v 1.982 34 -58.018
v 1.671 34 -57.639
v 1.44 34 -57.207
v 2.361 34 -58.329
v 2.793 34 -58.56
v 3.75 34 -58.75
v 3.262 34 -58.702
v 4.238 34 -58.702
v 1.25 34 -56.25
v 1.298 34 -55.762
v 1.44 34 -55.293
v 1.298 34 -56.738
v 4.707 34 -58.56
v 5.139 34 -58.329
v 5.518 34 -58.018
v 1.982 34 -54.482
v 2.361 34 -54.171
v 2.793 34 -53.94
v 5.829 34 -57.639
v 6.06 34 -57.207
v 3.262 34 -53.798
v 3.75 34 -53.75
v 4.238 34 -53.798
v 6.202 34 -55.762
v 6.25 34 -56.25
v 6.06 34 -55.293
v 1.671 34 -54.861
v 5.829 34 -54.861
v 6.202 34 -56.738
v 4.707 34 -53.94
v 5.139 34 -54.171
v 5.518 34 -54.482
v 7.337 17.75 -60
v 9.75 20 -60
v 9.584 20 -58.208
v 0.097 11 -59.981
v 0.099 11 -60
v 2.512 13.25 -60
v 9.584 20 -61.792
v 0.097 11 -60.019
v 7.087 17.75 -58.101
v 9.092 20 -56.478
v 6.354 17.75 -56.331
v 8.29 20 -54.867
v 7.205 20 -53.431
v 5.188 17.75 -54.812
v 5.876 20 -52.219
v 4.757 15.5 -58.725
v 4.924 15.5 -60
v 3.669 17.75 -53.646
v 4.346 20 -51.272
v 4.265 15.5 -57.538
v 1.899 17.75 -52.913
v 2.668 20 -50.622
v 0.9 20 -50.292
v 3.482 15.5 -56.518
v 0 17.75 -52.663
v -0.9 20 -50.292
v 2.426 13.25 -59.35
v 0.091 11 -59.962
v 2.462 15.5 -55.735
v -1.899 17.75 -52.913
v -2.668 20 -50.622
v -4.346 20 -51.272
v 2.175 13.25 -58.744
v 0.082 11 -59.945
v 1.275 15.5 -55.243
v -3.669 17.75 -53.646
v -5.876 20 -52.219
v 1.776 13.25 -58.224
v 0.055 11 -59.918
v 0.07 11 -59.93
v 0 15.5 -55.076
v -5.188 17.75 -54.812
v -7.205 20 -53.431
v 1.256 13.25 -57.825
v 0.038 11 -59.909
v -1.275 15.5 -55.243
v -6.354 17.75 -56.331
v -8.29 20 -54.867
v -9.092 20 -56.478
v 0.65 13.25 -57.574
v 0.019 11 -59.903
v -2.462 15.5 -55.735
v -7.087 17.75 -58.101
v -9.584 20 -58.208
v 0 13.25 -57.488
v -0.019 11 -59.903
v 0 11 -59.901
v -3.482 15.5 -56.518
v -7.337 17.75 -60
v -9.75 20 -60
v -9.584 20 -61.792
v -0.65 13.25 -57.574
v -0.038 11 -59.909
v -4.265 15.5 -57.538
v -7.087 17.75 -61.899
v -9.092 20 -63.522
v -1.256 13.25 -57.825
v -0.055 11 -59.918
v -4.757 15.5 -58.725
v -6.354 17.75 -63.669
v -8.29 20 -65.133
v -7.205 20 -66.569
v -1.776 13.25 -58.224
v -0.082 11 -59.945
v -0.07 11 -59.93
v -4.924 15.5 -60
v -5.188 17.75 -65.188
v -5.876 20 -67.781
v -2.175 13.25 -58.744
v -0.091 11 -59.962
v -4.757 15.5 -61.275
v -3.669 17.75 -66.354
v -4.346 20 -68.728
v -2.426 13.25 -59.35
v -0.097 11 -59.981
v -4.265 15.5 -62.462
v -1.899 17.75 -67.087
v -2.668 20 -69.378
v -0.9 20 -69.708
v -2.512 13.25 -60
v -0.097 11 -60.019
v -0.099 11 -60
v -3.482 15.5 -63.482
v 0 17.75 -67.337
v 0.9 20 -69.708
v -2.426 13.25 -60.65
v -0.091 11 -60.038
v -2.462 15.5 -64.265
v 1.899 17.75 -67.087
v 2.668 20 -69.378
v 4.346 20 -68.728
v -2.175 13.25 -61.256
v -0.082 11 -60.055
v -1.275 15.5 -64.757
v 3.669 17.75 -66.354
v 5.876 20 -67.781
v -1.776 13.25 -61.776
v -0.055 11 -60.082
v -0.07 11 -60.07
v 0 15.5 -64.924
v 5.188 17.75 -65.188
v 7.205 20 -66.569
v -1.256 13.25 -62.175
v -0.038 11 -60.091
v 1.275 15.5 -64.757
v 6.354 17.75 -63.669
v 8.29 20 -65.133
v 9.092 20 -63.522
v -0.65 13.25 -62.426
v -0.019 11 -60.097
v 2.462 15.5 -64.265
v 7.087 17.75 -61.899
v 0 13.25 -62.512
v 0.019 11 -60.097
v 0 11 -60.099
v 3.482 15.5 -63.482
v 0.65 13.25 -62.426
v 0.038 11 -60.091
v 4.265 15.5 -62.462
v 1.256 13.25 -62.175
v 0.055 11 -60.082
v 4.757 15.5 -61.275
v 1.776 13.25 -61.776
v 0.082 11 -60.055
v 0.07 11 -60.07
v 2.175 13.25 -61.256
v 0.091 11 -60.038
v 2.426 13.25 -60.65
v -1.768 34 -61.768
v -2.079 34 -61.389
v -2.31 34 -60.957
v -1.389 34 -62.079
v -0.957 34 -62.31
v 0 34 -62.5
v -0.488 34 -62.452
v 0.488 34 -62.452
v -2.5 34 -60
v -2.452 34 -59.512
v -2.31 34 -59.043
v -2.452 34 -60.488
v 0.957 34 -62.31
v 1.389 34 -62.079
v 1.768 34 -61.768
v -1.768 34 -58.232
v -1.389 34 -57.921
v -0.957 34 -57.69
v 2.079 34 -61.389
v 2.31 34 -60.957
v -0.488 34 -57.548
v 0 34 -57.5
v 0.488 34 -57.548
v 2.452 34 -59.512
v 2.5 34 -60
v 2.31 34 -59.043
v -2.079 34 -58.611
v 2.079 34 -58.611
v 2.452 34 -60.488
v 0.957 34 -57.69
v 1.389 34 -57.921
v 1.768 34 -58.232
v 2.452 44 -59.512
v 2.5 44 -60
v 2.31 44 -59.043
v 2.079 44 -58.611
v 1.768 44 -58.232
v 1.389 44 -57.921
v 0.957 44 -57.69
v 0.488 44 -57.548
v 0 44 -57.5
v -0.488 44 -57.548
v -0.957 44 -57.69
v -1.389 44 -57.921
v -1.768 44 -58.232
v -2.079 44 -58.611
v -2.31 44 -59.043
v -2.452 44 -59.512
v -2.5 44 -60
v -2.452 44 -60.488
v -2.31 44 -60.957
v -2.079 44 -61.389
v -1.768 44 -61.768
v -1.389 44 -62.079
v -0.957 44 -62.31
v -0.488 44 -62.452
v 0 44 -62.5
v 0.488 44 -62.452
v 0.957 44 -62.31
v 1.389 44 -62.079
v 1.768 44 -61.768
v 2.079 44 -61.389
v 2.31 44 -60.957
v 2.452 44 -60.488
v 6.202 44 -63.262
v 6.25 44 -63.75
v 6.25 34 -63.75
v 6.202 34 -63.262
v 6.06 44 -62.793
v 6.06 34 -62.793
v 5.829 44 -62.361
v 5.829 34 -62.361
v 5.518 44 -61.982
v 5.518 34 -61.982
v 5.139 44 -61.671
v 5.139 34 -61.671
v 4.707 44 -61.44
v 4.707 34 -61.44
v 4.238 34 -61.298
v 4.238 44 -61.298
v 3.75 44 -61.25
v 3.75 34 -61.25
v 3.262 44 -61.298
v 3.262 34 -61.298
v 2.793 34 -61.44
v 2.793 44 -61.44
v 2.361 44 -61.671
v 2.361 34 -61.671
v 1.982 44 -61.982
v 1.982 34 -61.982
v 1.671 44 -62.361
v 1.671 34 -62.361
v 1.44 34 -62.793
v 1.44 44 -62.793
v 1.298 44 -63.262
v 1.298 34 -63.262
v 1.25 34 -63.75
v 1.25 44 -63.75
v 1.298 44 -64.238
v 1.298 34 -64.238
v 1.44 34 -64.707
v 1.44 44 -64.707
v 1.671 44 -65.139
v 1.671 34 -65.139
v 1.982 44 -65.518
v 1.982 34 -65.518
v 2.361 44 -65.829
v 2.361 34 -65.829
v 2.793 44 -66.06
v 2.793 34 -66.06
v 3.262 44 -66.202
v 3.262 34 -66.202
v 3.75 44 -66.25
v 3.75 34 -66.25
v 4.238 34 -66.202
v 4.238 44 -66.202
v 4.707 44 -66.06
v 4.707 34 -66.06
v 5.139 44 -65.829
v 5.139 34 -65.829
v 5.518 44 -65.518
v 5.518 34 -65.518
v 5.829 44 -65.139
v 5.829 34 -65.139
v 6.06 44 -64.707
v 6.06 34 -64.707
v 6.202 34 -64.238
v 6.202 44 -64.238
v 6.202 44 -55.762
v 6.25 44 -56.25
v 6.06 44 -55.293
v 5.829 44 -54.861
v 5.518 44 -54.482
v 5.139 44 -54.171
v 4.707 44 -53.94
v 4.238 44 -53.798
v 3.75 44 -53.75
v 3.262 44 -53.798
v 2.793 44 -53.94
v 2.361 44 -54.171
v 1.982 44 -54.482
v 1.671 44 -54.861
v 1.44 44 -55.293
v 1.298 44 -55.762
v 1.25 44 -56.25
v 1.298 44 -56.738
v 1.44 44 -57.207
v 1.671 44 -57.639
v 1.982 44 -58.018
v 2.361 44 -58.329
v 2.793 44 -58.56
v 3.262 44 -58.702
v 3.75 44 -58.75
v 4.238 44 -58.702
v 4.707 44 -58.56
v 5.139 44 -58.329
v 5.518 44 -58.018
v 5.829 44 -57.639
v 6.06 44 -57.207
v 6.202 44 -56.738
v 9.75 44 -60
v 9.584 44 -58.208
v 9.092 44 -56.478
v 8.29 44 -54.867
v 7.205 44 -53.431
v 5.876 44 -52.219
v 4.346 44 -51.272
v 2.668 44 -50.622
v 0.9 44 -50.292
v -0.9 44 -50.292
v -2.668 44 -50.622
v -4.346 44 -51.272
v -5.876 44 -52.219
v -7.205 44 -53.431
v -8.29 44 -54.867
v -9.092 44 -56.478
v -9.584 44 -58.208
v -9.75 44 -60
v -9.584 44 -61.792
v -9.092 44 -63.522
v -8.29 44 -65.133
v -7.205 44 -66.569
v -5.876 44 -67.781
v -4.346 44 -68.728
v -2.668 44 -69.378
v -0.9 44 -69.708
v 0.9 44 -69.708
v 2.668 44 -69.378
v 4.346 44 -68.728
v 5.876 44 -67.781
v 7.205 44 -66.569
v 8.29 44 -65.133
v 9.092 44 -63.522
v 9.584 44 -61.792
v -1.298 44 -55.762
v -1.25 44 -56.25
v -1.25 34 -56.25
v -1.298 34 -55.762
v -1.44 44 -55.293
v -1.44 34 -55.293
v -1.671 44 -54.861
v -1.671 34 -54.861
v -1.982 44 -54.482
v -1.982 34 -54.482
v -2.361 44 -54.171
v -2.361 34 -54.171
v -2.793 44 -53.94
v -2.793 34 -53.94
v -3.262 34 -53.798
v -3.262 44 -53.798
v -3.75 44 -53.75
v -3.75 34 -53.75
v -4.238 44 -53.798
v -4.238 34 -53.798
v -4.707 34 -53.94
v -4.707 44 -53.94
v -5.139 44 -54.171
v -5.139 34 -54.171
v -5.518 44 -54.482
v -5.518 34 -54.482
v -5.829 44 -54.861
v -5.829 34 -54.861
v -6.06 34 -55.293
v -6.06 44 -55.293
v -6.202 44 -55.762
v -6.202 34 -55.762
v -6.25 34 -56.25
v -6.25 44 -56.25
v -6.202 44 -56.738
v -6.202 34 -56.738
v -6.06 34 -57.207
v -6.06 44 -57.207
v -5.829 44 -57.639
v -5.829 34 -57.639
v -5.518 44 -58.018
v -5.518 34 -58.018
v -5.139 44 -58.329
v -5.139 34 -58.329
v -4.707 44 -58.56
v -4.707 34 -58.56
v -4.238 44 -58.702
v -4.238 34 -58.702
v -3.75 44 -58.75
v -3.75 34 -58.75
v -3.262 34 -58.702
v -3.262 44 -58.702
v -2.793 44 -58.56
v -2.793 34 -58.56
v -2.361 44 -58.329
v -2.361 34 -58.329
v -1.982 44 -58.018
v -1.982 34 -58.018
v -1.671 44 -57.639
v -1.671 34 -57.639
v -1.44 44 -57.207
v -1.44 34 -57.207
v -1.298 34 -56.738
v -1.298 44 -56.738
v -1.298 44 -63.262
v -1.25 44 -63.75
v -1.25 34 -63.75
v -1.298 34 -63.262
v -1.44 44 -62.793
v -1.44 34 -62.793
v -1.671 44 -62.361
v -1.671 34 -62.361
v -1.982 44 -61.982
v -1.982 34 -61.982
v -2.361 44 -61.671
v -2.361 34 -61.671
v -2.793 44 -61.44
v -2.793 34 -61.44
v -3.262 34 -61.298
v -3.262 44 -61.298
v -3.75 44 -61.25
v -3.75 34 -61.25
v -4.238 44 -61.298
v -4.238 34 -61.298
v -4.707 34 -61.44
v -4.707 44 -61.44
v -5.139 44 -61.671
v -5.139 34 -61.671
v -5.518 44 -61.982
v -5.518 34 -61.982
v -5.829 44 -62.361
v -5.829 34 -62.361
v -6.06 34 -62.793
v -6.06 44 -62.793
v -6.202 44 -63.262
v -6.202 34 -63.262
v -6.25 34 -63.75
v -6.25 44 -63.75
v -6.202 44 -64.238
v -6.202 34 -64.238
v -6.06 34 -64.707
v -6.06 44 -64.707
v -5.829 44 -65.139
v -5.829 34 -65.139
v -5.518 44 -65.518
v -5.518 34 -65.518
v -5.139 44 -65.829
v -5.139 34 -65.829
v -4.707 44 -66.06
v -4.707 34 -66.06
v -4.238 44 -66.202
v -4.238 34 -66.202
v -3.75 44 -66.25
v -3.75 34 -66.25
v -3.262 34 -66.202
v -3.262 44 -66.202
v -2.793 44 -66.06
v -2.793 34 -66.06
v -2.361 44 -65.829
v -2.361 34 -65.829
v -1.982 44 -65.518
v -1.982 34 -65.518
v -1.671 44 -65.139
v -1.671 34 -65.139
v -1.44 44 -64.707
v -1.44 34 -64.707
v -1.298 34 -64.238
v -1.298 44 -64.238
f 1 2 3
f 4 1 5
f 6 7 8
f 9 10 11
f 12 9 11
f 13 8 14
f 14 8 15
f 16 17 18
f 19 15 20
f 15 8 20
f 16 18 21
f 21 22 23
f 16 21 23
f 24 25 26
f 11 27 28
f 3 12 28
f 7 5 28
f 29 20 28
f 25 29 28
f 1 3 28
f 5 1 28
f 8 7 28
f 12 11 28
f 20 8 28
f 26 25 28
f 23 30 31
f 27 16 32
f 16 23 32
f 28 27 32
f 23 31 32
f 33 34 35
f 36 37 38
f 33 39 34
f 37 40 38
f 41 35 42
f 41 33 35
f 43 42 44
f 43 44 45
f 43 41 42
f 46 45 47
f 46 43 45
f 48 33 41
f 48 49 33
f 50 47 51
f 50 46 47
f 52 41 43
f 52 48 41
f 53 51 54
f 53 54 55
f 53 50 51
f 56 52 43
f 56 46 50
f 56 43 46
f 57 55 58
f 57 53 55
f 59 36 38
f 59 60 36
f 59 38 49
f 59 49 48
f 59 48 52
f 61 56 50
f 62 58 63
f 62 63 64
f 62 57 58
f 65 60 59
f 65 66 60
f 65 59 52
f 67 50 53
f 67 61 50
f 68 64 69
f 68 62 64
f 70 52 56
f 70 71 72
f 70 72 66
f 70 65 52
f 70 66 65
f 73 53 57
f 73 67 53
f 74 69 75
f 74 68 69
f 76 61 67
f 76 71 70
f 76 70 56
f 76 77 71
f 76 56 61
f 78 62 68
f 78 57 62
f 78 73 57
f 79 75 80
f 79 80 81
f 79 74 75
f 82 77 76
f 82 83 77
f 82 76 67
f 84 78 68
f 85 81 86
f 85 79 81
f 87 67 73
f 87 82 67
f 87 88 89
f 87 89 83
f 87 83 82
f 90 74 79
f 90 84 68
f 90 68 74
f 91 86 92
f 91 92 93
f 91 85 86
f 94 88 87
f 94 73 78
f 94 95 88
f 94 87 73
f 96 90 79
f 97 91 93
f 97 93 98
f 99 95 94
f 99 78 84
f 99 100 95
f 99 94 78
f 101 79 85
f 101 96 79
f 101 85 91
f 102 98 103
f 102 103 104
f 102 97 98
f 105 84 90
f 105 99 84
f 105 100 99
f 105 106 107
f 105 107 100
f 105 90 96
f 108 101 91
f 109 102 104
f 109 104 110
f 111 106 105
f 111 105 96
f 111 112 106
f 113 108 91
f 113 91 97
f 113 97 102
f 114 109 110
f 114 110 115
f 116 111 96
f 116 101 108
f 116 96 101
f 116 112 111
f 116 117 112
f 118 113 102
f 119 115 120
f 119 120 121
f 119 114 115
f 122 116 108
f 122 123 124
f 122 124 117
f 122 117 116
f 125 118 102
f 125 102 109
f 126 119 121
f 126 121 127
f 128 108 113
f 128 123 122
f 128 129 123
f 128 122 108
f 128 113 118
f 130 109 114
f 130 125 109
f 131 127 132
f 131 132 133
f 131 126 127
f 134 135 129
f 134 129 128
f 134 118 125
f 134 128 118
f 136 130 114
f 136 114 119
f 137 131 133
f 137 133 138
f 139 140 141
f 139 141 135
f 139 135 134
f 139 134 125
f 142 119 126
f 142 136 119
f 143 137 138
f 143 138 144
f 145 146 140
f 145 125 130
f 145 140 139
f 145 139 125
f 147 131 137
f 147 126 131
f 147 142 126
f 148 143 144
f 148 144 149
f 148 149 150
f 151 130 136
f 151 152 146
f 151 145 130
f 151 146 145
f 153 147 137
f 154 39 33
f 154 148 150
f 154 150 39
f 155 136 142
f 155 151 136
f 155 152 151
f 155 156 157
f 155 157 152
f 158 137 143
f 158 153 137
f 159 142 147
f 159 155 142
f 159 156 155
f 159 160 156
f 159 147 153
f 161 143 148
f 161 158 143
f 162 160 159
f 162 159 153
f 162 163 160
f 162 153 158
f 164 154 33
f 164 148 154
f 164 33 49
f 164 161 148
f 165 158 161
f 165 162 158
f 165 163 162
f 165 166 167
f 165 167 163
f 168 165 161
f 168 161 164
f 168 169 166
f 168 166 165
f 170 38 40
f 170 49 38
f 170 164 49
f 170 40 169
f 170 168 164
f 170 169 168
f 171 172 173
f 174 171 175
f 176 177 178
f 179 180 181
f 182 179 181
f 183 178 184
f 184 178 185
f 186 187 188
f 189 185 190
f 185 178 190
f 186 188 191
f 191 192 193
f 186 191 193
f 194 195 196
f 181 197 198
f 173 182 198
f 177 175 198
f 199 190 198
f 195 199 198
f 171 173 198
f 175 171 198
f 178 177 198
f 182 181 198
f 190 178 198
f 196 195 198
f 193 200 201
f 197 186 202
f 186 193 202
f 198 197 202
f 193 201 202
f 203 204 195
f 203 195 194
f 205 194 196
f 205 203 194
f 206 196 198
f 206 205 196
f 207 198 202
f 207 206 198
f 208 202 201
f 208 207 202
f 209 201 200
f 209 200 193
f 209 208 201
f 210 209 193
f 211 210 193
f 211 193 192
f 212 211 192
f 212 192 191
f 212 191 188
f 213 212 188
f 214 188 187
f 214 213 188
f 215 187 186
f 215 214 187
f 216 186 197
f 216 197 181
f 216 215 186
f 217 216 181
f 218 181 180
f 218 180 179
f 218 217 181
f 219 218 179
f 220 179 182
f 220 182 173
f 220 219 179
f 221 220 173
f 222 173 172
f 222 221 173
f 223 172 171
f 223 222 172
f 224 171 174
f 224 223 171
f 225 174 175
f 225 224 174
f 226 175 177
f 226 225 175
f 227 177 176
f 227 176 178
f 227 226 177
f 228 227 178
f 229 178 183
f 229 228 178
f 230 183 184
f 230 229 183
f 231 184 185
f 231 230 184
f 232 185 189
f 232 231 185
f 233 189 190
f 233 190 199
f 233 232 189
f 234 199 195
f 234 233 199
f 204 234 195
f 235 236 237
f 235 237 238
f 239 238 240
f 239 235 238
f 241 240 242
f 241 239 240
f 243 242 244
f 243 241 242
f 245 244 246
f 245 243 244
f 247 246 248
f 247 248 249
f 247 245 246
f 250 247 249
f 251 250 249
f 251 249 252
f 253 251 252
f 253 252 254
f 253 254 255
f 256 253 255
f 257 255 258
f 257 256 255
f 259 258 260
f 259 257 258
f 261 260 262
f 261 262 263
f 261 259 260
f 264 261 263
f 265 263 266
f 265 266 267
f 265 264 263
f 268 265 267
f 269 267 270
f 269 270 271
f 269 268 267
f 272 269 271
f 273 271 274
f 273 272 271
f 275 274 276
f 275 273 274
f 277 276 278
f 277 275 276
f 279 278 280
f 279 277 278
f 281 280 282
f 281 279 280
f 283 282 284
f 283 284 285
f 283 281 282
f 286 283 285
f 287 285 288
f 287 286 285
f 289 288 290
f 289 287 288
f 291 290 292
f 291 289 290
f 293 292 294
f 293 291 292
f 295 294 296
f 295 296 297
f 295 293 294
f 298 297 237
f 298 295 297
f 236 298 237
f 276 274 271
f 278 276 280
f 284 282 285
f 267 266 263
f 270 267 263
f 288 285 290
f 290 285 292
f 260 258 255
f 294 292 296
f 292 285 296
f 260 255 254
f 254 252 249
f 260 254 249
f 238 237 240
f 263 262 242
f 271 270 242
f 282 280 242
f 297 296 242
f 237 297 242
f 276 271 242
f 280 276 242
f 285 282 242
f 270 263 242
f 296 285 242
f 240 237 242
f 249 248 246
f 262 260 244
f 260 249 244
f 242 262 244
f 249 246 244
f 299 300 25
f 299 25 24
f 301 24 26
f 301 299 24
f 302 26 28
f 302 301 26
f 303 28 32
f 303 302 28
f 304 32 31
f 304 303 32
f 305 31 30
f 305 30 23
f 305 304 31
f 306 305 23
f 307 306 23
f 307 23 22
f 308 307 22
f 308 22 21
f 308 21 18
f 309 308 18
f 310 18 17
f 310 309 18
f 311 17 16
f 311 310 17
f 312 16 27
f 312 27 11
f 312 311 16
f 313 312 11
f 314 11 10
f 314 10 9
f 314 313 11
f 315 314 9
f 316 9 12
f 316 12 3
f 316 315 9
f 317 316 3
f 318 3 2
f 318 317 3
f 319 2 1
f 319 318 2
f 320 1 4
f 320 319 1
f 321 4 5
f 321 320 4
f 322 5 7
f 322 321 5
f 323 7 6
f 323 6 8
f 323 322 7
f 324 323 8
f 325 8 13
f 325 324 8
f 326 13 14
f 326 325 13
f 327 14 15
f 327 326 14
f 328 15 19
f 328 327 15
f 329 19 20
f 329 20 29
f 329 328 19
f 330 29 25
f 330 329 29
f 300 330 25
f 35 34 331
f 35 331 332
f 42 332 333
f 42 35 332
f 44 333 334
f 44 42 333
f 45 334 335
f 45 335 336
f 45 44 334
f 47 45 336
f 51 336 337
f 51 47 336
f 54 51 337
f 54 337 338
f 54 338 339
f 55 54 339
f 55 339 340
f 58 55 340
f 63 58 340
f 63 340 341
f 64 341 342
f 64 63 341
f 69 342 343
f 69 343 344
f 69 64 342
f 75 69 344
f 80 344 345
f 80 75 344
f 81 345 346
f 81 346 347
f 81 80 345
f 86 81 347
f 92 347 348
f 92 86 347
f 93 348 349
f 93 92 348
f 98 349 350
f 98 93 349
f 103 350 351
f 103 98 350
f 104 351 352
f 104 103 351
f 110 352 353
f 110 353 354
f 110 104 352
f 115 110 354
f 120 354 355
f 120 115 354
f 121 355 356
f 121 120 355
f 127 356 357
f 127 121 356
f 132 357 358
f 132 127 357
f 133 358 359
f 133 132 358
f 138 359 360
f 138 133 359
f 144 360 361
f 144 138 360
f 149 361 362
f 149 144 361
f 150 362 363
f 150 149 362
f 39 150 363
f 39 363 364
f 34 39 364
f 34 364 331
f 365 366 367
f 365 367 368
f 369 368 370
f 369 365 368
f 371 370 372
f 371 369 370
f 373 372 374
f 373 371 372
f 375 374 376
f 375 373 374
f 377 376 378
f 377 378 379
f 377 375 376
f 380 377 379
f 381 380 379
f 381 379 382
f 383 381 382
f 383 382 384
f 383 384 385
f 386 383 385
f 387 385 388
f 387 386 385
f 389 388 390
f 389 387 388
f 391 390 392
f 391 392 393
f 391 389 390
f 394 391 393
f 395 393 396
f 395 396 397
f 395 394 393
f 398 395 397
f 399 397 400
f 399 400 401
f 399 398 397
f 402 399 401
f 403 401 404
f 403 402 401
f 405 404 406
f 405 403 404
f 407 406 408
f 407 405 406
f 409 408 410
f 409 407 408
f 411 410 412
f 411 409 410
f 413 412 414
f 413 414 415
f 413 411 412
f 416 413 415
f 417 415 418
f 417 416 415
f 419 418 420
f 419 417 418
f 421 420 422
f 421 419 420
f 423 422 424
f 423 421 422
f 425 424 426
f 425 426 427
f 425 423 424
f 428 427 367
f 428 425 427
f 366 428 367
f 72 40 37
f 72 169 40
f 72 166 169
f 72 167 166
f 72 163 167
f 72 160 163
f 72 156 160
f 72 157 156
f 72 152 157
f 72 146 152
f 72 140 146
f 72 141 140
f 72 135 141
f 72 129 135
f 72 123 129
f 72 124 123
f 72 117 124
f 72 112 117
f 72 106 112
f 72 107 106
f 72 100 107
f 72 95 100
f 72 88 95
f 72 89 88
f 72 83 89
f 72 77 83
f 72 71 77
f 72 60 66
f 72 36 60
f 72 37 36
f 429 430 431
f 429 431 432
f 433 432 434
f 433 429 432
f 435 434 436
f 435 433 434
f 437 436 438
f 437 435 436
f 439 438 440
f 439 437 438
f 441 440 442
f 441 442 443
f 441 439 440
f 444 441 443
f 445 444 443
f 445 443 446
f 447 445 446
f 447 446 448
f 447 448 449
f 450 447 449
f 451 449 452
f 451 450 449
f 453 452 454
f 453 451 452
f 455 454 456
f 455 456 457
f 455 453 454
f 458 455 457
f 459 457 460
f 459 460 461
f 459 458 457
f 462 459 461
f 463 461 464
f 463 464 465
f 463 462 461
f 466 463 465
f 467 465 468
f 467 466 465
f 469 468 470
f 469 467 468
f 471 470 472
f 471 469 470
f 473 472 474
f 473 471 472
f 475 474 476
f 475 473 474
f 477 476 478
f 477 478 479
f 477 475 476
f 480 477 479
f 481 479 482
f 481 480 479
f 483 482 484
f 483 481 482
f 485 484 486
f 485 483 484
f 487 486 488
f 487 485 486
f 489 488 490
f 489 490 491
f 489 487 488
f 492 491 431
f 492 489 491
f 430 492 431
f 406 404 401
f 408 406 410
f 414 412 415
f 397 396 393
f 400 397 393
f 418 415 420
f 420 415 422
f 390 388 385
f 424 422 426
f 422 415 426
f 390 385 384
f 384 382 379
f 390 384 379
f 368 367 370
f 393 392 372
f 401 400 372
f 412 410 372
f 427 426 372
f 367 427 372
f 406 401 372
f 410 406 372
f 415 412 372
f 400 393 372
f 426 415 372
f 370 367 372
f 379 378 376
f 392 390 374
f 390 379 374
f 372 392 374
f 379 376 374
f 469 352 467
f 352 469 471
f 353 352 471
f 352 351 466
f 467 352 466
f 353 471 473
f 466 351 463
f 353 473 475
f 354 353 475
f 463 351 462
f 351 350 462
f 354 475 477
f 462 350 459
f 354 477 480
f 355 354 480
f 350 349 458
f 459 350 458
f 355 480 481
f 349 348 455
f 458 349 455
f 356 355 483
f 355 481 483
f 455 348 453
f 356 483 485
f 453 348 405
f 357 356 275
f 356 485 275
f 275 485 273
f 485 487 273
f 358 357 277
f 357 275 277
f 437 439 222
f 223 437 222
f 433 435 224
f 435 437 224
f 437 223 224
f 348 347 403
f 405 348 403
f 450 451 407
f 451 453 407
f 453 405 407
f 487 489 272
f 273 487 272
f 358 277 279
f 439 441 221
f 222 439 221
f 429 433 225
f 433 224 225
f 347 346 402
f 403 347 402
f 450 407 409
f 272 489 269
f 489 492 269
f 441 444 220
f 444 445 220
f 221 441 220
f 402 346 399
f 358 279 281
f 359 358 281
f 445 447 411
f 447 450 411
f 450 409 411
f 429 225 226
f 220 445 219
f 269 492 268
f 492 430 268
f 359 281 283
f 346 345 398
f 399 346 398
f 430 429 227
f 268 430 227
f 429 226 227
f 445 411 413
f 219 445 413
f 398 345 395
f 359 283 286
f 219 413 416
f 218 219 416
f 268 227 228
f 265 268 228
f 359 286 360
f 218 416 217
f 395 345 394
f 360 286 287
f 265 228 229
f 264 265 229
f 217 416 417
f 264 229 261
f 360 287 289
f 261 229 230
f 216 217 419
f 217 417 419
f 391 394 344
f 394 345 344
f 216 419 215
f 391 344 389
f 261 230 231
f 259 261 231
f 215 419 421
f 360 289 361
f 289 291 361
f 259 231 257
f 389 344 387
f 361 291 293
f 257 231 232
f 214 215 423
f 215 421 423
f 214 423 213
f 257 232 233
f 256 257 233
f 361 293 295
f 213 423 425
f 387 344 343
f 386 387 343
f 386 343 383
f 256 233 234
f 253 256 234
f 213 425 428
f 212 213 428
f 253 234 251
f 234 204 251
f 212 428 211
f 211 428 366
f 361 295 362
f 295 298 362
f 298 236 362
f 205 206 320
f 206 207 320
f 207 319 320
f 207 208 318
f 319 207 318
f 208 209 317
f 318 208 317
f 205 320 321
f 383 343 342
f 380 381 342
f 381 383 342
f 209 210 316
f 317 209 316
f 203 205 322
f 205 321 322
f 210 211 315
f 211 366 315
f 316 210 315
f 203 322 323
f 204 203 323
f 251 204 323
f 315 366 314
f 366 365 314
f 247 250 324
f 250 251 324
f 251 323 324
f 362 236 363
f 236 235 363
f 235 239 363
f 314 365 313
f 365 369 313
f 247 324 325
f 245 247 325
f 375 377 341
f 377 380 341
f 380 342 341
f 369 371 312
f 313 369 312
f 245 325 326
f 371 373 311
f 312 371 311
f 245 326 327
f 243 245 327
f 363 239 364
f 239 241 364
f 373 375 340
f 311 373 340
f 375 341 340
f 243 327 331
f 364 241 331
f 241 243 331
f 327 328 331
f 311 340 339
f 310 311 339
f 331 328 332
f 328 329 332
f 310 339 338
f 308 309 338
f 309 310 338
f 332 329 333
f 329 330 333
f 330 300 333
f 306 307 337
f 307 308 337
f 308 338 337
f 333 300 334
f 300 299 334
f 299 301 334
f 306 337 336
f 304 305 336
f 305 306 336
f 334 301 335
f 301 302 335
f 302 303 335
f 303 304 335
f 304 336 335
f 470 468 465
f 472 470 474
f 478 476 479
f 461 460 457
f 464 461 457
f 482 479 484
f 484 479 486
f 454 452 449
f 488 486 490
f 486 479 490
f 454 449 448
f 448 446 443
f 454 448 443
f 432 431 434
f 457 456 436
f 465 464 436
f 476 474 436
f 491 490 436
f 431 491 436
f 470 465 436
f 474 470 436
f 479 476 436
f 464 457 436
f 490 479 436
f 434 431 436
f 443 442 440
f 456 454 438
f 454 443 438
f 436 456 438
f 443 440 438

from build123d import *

# Parameters (mm, degrees)
SKETCH033_R     = 9.75
PAD021_DEPTH    = 9
PAD021_TAPER    = 47
SKETCH034_R     = 9.75
PAD022_DEPTH    = 24
SKETCH035_R     = 2.5
POCKET008_DEPTH = 10


with BuildPart() as part:
    # Sketch033 → Pad021 (new body)
    with BuildSketch(Plane.XZ.offset(-20)):
        with Locations((0, -60)):
            Circle(SKETCH033_R)
    extrude(amount=PAD021_DEPTH, taper=PAD021_TAPER)

    # Sketch034 → Pad022 (join)
    with BuildSketch(Plane.XZ.offset(-20)):
        with Locations((0, -60)):
            Circle(SKETCH034_R)
    extrude(amount=-PAD022_DEPTH)

    # Sketch035 → Pocket008 (cut)
    with BuildSketch(Plane.XZ.offset(-44)):
        with Locations((-3.75, -56.25)):
            Circle(SKETCH035_R)
        with Locations((3.75, -56.25)):
            Circle(SKETCH035_R)
        with Locations((3.75, -63.75)):
            Circle(SKETCH035_R)
        with Locations((-3.75, -63.75)):
            Circle(SKETCH035_R)
        with Locations((0, -60)):
            Circle(SKETCH035_R)
    extrude(amount=POCKET008_DEPTH, mode=Mode.SUBTRACT)


solid = part.part
